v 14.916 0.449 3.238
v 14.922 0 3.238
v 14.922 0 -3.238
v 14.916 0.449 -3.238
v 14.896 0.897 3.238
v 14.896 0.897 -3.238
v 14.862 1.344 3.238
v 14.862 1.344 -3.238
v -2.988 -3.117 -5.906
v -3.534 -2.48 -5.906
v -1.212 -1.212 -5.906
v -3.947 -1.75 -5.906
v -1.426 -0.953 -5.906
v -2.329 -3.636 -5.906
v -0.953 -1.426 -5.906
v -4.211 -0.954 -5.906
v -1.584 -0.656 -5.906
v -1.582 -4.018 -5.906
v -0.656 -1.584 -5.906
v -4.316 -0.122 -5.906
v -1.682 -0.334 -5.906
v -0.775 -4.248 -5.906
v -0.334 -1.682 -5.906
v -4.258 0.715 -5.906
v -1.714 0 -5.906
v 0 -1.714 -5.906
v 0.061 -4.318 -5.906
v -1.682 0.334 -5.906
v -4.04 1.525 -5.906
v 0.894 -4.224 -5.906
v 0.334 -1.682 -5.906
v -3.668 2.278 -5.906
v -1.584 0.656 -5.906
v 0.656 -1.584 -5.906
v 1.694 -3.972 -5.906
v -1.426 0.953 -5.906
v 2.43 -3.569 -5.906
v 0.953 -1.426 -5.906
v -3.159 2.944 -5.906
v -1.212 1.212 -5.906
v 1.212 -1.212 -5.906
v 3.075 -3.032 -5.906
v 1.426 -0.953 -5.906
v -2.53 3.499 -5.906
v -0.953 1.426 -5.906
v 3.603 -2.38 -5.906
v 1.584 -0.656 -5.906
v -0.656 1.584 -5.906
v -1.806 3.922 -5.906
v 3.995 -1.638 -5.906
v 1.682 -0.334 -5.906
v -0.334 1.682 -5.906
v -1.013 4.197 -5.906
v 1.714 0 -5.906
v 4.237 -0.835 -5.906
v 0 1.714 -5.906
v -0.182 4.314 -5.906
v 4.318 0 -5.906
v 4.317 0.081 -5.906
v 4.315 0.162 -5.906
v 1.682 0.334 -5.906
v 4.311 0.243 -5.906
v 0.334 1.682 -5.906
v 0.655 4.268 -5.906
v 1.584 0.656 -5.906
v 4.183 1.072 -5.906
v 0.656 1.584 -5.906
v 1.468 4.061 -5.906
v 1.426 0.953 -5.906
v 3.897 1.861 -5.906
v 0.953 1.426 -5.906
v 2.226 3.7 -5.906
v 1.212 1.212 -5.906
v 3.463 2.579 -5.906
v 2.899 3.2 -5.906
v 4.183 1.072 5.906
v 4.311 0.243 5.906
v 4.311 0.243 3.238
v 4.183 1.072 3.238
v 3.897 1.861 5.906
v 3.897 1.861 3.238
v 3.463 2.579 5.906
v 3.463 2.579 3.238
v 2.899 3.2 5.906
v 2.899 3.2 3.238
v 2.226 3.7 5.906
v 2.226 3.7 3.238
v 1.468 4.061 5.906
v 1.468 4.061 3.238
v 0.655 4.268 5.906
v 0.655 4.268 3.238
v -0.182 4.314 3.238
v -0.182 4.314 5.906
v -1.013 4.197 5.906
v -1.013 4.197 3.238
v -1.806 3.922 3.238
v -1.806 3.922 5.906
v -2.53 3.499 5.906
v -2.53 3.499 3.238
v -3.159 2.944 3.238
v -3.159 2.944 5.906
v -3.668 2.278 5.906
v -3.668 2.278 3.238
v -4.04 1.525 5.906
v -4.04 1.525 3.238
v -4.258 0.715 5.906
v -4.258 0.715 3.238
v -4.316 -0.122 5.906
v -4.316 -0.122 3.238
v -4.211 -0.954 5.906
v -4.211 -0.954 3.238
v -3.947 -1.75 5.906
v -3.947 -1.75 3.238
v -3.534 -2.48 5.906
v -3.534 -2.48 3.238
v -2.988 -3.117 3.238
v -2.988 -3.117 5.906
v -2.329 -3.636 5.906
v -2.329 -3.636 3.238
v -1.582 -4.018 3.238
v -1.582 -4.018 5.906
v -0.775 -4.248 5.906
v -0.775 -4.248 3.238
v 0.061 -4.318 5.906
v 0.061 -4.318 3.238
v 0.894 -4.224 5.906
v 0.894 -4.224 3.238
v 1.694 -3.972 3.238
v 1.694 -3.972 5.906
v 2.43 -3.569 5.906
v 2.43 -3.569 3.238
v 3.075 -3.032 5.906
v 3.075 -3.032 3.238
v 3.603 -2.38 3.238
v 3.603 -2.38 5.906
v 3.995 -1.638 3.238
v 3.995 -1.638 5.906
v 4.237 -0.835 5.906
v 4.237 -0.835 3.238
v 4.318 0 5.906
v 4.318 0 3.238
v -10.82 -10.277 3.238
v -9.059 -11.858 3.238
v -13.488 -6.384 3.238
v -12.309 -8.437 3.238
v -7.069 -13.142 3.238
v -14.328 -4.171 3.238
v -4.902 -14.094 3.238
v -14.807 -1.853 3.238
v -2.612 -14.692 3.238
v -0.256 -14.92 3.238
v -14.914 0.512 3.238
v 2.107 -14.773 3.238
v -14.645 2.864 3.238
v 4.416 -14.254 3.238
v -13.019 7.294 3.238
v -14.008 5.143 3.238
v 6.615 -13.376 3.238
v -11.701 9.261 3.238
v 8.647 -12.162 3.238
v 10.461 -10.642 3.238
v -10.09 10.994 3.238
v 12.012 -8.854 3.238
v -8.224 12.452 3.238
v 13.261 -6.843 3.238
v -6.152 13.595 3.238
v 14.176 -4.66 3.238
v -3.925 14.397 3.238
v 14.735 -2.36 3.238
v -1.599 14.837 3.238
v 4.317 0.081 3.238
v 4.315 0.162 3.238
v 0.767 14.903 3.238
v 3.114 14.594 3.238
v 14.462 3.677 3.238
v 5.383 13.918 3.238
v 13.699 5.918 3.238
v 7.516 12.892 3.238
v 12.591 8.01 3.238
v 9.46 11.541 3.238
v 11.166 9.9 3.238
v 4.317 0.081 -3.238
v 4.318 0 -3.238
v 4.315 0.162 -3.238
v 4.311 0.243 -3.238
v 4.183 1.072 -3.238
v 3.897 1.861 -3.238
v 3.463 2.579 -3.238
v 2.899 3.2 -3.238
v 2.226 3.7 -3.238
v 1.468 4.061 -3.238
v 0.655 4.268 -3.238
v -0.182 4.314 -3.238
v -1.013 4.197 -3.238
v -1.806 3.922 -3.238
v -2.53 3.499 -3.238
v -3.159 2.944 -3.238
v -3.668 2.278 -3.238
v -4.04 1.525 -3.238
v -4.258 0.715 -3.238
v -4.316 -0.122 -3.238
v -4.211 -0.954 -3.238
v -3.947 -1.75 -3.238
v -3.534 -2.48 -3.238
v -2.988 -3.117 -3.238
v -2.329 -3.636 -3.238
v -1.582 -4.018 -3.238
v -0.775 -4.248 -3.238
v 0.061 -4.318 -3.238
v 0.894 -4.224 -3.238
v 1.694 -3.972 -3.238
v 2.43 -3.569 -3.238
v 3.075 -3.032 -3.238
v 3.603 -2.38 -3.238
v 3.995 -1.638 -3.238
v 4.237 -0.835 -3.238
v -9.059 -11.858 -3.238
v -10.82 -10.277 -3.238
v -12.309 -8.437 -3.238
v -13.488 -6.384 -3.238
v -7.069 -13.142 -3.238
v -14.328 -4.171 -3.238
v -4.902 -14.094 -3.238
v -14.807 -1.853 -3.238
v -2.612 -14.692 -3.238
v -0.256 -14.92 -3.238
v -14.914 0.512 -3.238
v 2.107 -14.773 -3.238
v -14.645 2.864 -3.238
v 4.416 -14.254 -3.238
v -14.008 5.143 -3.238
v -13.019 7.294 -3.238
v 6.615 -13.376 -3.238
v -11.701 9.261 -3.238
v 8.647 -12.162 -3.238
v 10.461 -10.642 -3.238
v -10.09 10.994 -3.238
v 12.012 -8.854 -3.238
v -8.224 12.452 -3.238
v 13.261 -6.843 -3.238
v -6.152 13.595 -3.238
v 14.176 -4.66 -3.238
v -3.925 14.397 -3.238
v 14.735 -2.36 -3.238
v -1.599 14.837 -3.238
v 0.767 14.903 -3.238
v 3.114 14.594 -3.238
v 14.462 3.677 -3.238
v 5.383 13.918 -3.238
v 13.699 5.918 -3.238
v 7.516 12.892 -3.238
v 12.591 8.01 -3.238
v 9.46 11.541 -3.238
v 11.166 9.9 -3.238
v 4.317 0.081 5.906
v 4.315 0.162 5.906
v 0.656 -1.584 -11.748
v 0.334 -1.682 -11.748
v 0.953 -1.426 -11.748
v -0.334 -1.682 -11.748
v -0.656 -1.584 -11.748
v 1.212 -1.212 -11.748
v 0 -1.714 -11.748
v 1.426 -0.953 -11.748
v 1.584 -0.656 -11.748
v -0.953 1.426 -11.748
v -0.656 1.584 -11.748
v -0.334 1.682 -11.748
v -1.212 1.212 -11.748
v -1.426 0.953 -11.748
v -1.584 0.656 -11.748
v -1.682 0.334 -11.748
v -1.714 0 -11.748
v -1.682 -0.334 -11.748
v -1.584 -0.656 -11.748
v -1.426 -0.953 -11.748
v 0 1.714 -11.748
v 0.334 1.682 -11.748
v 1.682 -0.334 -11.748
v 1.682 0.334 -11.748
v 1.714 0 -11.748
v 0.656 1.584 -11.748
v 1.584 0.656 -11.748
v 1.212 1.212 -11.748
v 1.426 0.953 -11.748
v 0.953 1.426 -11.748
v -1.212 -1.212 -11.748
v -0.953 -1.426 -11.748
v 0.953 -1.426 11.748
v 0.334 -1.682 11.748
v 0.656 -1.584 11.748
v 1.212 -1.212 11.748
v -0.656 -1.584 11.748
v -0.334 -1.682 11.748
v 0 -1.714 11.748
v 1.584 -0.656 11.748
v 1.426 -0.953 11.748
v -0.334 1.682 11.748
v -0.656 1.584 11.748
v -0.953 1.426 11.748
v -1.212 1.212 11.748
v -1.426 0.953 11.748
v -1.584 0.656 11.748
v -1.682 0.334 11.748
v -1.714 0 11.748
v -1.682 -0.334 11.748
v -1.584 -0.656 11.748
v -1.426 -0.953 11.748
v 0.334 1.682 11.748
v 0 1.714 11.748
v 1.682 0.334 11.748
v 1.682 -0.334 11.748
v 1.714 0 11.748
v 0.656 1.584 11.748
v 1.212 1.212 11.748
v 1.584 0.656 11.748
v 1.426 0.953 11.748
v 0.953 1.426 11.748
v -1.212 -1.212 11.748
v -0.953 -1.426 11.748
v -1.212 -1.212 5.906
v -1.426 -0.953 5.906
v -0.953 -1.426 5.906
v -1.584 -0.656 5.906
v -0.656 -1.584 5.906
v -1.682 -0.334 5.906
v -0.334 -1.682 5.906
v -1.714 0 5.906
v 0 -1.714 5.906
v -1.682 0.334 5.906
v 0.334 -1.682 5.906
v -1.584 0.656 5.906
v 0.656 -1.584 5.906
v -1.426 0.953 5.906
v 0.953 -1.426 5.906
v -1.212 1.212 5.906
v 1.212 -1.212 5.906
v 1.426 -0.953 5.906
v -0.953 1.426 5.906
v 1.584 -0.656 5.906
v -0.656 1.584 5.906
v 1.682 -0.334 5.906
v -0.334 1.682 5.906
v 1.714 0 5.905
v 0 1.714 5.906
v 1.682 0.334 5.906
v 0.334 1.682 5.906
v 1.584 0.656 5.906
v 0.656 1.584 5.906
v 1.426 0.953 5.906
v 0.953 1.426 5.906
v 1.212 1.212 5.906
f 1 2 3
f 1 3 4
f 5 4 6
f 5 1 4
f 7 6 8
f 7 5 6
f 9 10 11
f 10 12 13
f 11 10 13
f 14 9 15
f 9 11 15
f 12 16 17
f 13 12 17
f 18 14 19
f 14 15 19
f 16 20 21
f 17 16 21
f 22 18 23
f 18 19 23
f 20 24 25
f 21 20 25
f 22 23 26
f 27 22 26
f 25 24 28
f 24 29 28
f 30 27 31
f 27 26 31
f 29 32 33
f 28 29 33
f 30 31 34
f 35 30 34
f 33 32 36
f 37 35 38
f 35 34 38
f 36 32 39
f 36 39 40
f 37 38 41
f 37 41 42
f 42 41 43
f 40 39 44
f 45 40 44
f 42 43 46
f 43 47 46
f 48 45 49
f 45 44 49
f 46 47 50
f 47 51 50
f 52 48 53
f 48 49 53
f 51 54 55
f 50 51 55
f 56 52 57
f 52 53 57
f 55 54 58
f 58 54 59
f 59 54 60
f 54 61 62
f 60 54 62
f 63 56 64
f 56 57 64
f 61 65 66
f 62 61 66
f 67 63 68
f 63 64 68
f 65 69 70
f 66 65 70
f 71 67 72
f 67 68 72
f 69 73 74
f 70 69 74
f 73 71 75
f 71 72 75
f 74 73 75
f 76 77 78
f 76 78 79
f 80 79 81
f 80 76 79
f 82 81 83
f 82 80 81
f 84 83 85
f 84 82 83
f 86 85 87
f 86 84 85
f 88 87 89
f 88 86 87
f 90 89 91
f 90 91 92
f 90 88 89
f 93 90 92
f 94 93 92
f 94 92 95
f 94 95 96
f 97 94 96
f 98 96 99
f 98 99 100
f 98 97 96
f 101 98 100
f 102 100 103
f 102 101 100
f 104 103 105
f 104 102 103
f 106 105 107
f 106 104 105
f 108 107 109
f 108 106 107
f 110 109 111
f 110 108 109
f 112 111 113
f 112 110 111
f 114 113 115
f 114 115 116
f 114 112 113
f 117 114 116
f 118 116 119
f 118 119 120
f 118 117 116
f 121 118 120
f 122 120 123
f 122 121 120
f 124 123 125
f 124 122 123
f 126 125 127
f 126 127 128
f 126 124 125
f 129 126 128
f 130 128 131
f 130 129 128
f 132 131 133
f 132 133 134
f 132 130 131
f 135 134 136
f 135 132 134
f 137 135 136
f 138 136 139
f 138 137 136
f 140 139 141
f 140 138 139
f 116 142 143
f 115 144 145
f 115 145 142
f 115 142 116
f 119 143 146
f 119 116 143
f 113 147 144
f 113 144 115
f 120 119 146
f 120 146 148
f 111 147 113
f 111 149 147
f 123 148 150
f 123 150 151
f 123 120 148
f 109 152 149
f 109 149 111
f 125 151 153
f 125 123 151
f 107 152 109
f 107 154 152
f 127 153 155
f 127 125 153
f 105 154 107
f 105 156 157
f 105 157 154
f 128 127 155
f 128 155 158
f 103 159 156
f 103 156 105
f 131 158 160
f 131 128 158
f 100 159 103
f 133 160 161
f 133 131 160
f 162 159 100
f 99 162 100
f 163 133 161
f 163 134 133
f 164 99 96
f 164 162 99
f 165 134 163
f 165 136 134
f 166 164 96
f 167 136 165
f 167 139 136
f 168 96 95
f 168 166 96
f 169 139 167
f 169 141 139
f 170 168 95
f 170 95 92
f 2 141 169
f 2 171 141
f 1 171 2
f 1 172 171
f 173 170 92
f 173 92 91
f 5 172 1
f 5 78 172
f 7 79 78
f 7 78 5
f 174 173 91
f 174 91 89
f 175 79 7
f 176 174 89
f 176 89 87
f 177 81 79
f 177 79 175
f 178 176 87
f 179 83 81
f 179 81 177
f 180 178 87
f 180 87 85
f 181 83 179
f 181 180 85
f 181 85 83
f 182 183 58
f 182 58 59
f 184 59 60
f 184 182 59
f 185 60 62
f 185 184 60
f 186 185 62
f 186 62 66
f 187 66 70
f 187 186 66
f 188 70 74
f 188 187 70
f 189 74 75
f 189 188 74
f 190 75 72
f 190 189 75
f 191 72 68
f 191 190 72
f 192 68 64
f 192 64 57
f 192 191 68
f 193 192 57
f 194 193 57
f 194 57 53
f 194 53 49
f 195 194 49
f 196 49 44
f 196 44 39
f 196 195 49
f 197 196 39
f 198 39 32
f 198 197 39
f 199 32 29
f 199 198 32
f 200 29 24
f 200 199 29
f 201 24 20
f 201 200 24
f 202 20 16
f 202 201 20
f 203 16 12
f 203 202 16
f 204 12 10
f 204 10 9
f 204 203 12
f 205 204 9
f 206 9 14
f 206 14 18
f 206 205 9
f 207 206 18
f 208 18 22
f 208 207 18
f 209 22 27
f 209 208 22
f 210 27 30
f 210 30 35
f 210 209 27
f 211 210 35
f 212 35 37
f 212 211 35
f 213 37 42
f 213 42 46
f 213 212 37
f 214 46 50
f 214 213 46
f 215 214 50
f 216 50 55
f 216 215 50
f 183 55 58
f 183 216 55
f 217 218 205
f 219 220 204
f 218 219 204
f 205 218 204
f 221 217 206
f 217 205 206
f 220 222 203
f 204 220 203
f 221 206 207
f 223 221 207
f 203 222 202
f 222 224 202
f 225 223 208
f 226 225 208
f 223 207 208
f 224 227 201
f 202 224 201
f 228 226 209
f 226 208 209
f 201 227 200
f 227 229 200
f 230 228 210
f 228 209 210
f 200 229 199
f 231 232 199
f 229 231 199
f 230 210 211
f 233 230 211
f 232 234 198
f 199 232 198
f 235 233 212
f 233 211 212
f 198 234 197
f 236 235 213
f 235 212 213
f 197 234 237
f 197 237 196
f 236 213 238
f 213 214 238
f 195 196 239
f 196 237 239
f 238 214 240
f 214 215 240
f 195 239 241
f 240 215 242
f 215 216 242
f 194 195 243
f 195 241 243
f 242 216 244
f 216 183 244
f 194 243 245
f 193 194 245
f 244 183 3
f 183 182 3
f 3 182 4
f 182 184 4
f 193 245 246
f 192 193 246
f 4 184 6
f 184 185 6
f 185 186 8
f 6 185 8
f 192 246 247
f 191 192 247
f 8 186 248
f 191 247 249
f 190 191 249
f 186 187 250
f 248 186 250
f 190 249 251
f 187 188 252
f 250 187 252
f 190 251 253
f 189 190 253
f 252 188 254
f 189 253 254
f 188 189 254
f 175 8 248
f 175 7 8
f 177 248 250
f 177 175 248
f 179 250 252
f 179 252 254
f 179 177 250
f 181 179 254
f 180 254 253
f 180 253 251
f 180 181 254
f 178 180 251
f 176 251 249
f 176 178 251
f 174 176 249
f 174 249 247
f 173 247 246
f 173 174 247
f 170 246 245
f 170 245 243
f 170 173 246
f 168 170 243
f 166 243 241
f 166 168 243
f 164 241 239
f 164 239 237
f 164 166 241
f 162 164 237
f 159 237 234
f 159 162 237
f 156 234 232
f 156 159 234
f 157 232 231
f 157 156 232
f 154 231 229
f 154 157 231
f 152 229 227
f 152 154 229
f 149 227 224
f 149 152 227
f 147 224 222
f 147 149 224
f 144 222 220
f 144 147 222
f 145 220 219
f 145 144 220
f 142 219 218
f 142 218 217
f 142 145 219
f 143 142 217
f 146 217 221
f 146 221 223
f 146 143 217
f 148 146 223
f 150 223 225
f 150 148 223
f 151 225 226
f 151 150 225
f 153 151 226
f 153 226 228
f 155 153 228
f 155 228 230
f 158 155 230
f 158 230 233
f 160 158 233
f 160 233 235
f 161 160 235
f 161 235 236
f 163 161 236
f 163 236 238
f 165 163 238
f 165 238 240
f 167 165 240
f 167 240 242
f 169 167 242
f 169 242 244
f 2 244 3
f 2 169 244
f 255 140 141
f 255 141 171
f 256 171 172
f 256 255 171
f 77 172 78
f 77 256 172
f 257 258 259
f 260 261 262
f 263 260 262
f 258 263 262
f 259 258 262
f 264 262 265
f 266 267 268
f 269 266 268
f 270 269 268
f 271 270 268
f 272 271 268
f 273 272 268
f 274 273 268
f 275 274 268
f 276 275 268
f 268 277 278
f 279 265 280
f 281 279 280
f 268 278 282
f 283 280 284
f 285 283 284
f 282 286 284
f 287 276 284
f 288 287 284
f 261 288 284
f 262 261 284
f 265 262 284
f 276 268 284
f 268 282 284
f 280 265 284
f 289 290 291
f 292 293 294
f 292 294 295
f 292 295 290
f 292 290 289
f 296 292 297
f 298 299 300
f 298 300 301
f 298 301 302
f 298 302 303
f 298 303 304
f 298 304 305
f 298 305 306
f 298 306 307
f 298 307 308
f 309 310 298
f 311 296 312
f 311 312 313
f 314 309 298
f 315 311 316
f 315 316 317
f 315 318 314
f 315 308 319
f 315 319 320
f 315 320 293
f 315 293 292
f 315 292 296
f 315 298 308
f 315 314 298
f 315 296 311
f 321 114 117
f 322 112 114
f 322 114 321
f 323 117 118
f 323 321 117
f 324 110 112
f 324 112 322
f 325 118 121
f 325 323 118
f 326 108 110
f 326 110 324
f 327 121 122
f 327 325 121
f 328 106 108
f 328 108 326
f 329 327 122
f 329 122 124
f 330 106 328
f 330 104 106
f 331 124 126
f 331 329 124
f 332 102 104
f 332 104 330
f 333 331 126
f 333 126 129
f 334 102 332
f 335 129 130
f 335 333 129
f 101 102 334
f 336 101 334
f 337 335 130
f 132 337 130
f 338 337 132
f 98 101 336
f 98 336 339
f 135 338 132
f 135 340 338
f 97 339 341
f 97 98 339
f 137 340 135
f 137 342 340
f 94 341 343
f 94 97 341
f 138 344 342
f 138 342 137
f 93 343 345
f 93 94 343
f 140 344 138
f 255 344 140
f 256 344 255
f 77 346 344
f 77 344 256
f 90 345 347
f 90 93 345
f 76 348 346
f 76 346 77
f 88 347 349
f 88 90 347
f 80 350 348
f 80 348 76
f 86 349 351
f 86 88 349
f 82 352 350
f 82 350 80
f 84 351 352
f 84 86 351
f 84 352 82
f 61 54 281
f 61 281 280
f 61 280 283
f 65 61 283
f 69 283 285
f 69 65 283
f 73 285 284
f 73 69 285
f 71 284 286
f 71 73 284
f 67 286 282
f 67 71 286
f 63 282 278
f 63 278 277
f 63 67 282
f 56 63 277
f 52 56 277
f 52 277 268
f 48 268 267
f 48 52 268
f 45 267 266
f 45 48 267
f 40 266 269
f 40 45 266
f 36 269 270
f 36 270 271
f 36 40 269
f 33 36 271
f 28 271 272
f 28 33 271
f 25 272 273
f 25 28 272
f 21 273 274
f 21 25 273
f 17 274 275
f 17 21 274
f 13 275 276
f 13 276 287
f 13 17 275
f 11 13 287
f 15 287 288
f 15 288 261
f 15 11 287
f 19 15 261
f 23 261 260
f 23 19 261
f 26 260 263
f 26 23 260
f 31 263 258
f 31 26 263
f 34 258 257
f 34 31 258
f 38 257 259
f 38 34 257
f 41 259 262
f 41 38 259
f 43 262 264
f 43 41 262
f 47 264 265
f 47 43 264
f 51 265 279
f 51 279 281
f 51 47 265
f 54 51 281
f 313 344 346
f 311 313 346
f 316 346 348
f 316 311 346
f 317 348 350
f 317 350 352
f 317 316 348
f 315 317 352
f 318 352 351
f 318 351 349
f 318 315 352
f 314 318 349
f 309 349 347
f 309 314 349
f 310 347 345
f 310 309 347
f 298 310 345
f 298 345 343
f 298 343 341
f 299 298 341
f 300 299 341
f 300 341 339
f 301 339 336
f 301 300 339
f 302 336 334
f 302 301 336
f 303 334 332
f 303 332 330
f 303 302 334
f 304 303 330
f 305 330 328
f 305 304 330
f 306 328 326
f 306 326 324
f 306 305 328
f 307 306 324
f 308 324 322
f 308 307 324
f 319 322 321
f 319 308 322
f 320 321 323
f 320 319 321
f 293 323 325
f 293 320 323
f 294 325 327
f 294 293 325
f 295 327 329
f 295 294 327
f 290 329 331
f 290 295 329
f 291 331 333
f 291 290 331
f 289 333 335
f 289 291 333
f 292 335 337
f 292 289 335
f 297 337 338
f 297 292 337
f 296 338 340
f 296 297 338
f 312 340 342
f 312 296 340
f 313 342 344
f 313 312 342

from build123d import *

# Parameters (mm, degrees)
F1_DEPTH = 3.2385
F3_DEPTH = 5.9055
F4_R     = 1.7145
F5_DEPTH = 11.7475


with BuildPart() as f1:
    # F0 (on Top) → F1 (new body, symmetric)
    with BuildSketch(Plane.XY):
        with BuildLine():
            ThreePointArc((14.861846, 1.344079), (-14.907329, -0.672724), (14.9225, 0))
            ThreePointArc((14.9225, 0), (14.907329, 0.672724), (14.861846, 1.344079))
        make_face()
    extrude(amount=F1_DEPTH, both=True)

    # F2 (on Top) → F3 (join, symmetric)
    with BuildSketch(Plane.XY):
        with BuildLine():
            ThreePointArc((4.311158, 0.242977), (-4.316289, -0.121537), (4.318, 0))
            ThreePointArc((4.318, 0), (4.316289, 0.121537), (4.311158, 0.242977))
        make_face()
    extrude(amount=F3_DEPTH, both=True)

    # F4 (on Top) → F5 (join, symmetric)
    with BuildSketch(Plane.XY):
        Circle(F4_R)
    extrude(amount=F5_DEPTH, both=True)


solid = f1.part
